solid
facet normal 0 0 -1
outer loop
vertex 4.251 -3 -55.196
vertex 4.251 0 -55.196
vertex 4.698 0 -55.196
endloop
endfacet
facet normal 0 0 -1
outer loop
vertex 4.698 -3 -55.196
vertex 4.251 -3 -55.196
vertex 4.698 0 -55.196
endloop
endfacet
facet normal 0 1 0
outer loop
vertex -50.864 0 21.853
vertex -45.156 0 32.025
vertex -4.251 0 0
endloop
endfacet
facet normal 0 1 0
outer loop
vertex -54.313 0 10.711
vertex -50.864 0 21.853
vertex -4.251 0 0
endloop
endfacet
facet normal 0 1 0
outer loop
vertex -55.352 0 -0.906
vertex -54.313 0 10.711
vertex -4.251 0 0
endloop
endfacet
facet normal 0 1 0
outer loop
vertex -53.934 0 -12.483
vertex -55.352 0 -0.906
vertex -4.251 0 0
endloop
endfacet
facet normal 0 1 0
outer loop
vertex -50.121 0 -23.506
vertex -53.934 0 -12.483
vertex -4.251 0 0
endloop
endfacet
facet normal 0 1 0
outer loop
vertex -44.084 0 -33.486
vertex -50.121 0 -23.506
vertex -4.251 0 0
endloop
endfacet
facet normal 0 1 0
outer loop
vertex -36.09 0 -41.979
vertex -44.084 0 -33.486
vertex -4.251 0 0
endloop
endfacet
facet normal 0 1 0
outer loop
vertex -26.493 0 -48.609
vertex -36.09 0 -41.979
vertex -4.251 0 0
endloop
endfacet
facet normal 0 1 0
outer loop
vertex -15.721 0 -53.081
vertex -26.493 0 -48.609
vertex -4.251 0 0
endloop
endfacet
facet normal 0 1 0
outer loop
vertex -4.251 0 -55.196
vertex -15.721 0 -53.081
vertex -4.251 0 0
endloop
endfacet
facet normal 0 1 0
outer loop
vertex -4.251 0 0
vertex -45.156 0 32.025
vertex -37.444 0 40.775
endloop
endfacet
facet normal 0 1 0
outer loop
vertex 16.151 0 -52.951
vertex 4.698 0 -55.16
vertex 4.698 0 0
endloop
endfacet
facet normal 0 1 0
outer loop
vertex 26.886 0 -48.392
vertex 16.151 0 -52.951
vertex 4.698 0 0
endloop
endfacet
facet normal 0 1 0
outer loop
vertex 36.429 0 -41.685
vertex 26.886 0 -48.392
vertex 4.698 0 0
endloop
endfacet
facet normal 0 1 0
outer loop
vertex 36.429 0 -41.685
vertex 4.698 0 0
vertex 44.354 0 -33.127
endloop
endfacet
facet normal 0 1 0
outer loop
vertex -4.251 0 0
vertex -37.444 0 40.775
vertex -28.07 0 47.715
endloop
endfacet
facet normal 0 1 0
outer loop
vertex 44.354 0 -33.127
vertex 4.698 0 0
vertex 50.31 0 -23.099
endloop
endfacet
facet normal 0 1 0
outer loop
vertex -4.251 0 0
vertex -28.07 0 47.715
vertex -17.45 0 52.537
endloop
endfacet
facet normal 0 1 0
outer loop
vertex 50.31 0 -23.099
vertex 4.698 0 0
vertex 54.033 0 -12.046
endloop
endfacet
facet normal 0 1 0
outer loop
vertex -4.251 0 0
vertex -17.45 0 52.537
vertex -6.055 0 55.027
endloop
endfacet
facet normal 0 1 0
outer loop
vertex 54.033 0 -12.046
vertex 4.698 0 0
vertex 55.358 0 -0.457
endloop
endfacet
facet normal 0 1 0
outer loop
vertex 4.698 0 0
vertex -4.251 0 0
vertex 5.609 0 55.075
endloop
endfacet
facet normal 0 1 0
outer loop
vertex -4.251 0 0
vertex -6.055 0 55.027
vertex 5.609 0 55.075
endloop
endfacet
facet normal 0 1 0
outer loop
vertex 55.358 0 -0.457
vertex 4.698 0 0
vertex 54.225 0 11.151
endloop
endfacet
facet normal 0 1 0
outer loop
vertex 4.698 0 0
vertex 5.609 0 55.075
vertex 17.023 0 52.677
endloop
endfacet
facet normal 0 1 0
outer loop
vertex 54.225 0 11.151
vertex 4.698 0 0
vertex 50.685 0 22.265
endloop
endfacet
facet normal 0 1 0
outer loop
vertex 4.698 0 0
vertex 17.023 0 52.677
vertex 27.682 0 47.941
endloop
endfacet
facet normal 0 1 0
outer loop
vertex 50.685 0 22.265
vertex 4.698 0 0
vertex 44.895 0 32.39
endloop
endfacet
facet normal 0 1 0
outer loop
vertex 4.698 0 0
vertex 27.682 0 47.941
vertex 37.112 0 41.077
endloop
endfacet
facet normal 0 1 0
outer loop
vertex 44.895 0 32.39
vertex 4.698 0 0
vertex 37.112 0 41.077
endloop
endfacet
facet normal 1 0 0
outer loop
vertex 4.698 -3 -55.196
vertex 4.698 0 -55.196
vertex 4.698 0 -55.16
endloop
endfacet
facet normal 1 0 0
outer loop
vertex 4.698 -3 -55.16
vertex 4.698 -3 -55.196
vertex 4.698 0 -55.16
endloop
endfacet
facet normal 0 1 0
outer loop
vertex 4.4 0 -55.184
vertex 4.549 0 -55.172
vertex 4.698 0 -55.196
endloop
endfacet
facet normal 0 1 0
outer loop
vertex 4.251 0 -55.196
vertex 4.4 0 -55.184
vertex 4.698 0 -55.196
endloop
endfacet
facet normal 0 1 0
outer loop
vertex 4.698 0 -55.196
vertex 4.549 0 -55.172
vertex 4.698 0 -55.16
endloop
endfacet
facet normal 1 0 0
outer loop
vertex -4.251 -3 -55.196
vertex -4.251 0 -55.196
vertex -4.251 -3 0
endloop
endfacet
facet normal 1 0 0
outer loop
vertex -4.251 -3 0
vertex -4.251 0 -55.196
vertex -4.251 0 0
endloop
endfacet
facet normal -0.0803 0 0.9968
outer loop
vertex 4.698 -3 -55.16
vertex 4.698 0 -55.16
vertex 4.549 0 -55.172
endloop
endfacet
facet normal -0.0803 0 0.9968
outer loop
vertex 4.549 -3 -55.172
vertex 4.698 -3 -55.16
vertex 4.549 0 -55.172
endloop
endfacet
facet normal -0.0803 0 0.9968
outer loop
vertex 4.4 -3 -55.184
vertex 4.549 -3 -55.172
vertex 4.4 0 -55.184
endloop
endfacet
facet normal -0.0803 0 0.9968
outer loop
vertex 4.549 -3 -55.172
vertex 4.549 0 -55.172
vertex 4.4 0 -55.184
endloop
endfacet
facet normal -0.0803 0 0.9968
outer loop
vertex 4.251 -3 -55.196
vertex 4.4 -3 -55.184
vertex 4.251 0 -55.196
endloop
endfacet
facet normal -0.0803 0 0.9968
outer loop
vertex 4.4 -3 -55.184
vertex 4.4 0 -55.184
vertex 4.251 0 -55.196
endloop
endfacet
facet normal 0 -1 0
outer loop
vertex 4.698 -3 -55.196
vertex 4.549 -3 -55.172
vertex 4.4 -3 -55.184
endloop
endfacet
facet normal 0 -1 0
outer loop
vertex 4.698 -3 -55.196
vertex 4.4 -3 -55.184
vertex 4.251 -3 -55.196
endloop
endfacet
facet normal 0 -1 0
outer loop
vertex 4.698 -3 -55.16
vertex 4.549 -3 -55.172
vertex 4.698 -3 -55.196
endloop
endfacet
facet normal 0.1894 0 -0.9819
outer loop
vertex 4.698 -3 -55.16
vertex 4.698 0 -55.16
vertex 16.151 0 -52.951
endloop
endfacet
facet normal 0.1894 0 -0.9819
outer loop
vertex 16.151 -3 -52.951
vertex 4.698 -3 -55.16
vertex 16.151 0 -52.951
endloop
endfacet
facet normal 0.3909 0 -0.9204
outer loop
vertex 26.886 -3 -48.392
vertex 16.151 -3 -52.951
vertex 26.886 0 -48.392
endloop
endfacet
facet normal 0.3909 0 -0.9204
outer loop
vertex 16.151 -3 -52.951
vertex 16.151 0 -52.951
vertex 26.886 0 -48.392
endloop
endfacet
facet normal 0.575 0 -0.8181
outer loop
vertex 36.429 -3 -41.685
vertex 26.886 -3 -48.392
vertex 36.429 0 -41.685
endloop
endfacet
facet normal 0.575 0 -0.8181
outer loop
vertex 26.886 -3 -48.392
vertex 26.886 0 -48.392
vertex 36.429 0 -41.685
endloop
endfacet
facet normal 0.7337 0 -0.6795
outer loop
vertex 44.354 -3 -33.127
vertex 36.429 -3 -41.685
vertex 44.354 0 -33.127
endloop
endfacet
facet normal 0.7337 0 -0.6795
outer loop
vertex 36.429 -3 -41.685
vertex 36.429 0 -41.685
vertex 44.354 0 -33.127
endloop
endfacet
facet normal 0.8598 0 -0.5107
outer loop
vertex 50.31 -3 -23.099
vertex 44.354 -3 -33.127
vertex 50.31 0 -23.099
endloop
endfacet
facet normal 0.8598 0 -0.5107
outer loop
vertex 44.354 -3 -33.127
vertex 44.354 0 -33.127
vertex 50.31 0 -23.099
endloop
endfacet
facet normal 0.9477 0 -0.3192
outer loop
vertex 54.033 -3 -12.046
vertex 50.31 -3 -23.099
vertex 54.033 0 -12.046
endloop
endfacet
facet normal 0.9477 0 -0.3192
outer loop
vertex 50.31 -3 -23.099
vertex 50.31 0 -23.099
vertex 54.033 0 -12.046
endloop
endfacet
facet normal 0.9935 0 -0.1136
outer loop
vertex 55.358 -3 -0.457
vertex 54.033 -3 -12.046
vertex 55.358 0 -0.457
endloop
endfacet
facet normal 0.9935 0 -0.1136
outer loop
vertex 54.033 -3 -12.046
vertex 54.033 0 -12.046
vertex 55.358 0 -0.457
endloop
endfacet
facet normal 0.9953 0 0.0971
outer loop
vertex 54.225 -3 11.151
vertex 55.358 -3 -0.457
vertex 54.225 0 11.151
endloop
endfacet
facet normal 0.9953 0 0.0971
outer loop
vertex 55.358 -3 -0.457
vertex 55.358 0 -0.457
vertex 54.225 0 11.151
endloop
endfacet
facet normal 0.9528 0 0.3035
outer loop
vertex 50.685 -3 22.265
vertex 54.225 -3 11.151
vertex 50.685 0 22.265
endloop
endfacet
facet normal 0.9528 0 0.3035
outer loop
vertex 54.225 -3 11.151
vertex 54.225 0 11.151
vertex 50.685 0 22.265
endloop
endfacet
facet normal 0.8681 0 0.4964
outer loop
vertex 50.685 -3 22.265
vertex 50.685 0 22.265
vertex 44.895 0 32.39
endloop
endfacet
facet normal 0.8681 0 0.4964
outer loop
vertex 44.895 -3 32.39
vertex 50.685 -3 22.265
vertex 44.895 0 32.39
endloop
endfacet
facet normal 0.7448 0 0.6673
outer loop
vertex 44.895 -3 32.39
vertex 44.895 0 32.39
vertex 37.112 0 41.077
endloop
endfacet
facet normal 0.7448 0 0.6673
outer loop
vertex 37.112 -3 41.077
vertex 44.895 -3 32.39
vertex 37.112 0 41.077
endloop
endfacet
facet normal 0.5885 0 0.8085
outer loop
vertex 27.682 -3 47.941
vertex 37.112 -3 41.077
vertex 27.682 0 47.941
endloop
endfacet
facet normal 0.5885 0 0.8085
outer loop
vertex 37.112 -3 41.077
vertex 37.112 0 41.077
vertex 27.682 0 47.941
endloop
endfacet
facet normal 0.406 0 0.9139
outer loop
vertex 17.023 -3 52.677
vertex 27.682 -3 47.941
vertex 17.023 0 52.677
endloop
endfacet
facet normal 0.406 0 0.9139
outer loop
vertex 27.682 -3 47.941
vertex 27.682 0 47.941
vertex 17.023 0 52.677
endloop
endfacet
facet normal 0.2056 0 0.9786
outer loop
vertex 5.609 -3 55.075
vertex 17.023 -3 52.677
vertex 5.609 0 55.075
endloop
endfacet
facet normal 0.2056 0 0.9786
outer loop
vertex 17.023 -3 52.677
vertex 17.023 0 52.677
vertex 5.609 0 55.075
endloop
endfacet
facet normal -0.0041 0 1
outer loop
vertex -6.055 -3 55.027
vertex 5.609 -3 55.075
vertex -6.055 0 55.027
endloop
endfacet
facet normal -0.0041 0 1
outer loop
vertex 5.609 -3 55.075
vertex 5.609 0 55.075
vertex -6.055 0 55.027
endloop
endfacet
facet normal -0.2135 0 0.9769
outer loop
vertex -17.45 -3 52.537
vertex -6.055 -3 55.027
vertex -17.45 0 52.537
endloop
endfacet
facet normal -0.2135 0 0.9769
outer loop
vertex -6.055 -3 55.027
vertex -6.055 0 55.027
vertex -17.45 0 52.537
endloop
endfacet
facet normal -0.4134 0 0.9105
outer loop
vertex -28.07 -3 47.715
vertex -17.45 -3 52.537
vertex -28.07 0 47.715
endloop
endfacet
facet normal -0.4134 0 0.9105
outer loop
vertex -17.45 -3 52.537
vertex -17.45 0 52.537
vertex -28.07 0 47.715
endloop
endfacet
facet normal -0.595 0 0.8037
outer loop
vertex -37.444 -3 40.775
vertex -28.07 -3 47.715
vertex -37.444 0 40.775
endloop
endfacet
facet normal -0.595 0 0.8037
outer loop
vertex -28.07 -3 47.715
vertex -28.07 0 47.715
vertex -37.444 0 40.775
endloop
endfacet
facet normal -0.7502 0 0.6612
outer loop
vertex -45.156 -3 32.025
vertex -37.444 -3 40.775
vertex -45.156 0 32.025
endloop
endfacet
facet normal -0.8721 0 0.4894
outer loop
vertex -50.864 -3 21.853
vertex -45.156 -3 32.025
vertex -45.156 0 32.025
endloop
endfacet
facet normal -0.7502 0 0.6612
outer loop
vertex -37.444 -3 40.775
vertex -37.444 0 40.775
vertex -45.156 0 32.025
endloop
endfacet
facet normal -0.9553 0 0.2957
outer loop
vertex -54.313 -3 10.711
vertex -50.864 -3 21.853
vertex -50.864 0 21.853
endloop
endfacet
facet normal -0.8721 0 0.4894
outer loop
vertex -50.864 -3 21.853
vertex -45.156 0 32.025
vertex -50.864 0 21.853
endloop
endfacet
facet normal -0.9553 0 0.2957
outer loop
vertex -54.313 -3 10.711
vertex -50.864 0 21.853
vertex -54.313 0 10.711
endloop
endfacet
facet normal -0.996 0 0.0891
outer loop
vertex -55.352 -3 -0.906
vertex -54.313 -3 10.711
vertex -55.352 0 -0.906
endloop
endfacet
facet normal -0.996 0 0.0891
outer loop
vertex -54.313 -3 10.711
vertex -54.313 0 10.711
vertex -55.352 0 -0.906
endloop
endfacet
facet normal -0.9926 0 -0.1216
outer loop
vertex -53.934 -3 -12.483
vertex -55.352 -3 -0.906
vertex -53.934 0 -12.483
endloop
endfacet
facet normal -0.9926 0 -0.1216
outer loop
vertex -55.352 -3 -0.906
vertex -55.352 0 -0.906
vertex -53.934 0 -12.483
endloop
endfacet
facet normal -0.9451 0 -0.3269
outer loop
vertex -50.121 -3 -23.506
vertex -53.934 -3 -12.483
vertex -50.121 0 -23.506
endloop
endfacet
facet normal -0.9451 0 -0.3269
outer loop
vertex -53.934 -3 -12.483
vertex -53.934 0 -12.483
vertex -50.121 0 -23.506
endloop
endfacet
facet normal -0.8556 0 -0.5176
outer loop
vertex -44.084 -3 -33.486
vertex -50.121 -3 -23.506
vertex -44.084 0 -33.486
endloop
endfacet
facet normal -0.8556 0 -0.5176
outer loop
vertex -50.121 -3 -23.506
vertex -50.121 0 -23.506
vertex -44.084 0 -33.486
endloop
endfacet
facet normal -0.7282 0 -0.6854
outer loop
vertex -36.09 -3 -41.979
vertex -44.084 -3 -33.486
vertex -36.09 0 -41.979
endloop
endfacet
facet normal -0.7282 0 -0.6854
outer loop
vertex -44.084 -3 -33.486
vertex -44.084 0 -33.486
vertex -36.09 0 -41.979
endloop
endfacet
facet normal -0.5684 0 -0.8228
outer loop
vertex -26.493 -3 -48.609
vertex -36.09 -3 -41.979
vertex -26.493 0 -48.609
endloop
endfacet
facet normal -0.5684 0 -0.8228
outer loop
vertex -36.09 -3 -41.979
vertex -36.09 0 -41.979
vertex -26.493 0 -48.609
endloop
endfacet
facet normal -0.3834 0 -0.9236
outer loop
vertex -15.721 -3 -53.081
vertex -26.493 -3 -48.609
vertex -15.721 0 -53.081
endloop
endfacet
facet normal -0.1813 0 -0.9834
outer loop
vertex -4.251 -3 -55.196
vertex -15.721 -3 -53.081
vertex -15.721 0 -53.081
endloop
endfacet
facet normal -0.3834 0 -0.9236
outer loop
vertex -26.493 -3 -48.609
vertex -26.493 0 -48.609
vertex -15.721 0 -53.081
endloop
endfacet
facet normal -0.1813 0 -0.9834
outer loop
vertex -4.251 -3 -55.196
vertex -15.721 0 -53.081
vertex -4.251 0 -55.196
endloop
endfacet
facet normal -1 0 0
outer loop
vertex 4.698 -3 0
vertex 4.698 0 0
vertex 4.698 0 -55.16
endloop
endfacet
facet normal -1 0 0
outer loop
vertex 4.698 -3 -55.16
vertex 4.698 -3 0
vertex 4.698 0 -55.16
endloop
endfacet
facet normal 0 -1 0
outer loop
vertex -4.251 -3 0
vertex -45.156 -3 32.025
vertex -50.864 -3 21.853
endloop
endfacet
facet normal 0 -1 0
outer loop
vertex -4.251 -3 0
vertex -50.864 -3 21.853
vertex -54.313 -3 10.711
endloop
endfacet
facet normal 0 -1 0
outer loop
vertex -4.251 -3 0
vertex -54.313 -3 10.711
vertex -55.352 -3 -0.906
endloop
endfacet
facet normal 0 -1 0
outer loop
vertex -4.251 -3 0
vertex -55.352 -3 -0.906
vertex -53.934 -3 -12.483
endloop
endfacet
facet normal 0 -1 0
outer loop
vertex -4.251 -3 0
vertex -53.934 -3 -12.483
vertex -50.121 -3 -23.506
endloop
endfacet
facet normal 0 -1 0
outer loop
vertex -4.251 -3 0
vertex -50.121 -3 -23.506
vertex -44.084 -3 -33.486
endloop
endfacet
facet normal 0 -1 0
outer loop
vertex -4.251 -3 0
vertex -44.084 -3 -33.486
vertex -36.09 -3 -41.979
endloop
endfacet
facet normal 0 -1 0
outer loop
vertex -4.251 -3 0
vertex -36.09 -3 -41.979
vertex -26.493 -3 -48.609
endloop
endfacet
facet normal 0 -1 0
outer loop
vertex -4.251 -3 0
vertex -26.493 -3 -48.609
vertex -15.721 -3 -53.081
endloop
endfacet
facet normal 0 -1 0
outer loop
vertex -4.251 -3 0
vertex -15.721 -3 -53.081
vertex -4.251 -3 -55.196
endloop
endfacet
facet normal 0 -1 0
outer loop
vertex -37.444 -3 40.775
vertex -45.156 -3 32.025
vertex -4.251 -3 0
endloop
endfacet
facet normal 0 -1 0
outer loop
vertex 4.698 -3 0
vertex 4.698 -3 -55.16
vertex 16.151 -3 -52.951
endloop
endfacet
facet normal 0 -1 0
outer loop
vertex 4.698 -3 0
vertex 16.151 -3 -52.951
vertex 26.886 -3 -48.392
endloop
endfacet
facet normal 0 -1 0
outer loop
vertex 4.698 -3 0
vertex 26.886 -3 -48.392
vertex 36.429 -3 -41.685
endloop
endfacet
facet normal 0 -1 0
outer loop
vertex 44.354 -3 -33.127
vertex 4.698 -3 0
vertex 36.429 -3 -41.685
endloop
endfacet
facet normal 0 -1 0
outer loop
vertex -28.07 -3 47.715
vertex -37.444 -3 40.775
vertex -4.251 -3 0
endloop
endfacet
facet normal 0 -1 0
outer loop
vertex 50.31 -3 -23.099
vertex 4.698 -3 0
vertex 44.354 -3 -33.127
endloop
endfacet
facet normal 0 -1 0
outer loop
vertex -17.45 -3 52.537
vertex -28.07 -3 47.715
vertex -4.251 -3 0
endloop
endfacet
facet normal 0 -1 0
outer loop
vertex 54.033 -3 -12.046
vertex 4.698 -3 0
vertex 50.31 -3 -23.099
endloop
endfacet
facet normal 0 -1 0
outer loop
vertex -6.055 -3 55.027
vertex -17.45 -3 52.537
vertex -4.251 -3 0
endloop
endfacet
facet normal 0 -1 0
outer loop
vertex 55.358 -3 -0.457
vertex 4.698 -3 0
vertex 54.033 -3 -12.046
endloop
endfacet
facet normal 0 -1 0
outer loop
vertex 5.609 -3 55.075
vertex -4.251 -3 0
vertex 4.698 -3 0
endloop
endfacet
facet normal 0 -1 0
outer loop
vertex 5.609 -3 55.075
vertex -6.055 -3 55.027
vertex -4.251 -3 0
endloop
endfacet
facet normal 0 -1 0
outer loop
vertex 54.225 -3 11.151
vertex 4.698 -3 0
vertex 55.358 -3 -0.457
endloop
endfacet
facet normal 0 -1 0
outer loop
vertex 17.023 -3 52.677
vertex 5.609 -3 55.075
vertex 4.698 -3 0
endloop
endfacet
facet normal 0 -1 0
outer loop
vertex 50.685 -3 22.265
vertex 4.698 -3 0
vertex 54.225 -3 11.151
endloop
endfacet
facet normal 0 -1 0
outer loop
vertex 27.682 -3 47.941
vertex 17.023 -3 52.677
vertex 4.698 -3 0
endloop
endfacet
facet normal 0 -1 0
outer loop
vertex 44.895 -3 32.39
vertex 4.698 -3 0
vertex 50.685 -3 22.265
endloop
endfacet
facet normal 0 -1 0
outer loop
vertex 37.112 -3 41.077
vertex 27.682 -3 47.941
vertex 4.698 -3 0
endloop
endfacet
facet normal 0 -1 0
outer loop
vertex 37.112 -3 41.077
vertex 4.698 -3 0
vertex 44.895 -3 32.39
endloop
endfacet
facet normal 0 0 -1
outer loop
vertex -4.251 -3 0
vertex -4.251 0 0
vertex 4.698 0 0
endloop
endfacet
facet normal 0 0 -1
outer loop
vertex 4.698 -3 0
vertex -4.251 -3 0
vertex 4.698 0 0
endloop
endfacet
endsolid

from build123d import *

# Parameters (mm, degrees)
F1_DEPTH = 3


with BuildPart() as f1:
    # F0 (on Front) → F1 (new body)
    with BuildSketch(Plane.XZ):
        with BuildLine():
            Line((4.698028, 0), (4.698028, -55.159888))
            ThreePointArc((4.698028, -55.159888), (-0.224447, 55.35914), (-4.250602, -55.196169))
            Line((-4.250602, -55.196169), (-4.250602, 0))
            Line((-4.250602, 0), (4.698028, 0))
        make_face()
        with BuildLine():
            ThreePointArc((4.698028, -55.159888), (4.474352, -55.178482), (4.250602, -55.196169))
            Line((4.250602, -55.196169), (4.698028, -55.196169))
            Line((4.698028, -55.196169), (4.698028, -55.159888))
        make_face()
    extrude(amount=F1_DEPTH)


solid = f1.part
